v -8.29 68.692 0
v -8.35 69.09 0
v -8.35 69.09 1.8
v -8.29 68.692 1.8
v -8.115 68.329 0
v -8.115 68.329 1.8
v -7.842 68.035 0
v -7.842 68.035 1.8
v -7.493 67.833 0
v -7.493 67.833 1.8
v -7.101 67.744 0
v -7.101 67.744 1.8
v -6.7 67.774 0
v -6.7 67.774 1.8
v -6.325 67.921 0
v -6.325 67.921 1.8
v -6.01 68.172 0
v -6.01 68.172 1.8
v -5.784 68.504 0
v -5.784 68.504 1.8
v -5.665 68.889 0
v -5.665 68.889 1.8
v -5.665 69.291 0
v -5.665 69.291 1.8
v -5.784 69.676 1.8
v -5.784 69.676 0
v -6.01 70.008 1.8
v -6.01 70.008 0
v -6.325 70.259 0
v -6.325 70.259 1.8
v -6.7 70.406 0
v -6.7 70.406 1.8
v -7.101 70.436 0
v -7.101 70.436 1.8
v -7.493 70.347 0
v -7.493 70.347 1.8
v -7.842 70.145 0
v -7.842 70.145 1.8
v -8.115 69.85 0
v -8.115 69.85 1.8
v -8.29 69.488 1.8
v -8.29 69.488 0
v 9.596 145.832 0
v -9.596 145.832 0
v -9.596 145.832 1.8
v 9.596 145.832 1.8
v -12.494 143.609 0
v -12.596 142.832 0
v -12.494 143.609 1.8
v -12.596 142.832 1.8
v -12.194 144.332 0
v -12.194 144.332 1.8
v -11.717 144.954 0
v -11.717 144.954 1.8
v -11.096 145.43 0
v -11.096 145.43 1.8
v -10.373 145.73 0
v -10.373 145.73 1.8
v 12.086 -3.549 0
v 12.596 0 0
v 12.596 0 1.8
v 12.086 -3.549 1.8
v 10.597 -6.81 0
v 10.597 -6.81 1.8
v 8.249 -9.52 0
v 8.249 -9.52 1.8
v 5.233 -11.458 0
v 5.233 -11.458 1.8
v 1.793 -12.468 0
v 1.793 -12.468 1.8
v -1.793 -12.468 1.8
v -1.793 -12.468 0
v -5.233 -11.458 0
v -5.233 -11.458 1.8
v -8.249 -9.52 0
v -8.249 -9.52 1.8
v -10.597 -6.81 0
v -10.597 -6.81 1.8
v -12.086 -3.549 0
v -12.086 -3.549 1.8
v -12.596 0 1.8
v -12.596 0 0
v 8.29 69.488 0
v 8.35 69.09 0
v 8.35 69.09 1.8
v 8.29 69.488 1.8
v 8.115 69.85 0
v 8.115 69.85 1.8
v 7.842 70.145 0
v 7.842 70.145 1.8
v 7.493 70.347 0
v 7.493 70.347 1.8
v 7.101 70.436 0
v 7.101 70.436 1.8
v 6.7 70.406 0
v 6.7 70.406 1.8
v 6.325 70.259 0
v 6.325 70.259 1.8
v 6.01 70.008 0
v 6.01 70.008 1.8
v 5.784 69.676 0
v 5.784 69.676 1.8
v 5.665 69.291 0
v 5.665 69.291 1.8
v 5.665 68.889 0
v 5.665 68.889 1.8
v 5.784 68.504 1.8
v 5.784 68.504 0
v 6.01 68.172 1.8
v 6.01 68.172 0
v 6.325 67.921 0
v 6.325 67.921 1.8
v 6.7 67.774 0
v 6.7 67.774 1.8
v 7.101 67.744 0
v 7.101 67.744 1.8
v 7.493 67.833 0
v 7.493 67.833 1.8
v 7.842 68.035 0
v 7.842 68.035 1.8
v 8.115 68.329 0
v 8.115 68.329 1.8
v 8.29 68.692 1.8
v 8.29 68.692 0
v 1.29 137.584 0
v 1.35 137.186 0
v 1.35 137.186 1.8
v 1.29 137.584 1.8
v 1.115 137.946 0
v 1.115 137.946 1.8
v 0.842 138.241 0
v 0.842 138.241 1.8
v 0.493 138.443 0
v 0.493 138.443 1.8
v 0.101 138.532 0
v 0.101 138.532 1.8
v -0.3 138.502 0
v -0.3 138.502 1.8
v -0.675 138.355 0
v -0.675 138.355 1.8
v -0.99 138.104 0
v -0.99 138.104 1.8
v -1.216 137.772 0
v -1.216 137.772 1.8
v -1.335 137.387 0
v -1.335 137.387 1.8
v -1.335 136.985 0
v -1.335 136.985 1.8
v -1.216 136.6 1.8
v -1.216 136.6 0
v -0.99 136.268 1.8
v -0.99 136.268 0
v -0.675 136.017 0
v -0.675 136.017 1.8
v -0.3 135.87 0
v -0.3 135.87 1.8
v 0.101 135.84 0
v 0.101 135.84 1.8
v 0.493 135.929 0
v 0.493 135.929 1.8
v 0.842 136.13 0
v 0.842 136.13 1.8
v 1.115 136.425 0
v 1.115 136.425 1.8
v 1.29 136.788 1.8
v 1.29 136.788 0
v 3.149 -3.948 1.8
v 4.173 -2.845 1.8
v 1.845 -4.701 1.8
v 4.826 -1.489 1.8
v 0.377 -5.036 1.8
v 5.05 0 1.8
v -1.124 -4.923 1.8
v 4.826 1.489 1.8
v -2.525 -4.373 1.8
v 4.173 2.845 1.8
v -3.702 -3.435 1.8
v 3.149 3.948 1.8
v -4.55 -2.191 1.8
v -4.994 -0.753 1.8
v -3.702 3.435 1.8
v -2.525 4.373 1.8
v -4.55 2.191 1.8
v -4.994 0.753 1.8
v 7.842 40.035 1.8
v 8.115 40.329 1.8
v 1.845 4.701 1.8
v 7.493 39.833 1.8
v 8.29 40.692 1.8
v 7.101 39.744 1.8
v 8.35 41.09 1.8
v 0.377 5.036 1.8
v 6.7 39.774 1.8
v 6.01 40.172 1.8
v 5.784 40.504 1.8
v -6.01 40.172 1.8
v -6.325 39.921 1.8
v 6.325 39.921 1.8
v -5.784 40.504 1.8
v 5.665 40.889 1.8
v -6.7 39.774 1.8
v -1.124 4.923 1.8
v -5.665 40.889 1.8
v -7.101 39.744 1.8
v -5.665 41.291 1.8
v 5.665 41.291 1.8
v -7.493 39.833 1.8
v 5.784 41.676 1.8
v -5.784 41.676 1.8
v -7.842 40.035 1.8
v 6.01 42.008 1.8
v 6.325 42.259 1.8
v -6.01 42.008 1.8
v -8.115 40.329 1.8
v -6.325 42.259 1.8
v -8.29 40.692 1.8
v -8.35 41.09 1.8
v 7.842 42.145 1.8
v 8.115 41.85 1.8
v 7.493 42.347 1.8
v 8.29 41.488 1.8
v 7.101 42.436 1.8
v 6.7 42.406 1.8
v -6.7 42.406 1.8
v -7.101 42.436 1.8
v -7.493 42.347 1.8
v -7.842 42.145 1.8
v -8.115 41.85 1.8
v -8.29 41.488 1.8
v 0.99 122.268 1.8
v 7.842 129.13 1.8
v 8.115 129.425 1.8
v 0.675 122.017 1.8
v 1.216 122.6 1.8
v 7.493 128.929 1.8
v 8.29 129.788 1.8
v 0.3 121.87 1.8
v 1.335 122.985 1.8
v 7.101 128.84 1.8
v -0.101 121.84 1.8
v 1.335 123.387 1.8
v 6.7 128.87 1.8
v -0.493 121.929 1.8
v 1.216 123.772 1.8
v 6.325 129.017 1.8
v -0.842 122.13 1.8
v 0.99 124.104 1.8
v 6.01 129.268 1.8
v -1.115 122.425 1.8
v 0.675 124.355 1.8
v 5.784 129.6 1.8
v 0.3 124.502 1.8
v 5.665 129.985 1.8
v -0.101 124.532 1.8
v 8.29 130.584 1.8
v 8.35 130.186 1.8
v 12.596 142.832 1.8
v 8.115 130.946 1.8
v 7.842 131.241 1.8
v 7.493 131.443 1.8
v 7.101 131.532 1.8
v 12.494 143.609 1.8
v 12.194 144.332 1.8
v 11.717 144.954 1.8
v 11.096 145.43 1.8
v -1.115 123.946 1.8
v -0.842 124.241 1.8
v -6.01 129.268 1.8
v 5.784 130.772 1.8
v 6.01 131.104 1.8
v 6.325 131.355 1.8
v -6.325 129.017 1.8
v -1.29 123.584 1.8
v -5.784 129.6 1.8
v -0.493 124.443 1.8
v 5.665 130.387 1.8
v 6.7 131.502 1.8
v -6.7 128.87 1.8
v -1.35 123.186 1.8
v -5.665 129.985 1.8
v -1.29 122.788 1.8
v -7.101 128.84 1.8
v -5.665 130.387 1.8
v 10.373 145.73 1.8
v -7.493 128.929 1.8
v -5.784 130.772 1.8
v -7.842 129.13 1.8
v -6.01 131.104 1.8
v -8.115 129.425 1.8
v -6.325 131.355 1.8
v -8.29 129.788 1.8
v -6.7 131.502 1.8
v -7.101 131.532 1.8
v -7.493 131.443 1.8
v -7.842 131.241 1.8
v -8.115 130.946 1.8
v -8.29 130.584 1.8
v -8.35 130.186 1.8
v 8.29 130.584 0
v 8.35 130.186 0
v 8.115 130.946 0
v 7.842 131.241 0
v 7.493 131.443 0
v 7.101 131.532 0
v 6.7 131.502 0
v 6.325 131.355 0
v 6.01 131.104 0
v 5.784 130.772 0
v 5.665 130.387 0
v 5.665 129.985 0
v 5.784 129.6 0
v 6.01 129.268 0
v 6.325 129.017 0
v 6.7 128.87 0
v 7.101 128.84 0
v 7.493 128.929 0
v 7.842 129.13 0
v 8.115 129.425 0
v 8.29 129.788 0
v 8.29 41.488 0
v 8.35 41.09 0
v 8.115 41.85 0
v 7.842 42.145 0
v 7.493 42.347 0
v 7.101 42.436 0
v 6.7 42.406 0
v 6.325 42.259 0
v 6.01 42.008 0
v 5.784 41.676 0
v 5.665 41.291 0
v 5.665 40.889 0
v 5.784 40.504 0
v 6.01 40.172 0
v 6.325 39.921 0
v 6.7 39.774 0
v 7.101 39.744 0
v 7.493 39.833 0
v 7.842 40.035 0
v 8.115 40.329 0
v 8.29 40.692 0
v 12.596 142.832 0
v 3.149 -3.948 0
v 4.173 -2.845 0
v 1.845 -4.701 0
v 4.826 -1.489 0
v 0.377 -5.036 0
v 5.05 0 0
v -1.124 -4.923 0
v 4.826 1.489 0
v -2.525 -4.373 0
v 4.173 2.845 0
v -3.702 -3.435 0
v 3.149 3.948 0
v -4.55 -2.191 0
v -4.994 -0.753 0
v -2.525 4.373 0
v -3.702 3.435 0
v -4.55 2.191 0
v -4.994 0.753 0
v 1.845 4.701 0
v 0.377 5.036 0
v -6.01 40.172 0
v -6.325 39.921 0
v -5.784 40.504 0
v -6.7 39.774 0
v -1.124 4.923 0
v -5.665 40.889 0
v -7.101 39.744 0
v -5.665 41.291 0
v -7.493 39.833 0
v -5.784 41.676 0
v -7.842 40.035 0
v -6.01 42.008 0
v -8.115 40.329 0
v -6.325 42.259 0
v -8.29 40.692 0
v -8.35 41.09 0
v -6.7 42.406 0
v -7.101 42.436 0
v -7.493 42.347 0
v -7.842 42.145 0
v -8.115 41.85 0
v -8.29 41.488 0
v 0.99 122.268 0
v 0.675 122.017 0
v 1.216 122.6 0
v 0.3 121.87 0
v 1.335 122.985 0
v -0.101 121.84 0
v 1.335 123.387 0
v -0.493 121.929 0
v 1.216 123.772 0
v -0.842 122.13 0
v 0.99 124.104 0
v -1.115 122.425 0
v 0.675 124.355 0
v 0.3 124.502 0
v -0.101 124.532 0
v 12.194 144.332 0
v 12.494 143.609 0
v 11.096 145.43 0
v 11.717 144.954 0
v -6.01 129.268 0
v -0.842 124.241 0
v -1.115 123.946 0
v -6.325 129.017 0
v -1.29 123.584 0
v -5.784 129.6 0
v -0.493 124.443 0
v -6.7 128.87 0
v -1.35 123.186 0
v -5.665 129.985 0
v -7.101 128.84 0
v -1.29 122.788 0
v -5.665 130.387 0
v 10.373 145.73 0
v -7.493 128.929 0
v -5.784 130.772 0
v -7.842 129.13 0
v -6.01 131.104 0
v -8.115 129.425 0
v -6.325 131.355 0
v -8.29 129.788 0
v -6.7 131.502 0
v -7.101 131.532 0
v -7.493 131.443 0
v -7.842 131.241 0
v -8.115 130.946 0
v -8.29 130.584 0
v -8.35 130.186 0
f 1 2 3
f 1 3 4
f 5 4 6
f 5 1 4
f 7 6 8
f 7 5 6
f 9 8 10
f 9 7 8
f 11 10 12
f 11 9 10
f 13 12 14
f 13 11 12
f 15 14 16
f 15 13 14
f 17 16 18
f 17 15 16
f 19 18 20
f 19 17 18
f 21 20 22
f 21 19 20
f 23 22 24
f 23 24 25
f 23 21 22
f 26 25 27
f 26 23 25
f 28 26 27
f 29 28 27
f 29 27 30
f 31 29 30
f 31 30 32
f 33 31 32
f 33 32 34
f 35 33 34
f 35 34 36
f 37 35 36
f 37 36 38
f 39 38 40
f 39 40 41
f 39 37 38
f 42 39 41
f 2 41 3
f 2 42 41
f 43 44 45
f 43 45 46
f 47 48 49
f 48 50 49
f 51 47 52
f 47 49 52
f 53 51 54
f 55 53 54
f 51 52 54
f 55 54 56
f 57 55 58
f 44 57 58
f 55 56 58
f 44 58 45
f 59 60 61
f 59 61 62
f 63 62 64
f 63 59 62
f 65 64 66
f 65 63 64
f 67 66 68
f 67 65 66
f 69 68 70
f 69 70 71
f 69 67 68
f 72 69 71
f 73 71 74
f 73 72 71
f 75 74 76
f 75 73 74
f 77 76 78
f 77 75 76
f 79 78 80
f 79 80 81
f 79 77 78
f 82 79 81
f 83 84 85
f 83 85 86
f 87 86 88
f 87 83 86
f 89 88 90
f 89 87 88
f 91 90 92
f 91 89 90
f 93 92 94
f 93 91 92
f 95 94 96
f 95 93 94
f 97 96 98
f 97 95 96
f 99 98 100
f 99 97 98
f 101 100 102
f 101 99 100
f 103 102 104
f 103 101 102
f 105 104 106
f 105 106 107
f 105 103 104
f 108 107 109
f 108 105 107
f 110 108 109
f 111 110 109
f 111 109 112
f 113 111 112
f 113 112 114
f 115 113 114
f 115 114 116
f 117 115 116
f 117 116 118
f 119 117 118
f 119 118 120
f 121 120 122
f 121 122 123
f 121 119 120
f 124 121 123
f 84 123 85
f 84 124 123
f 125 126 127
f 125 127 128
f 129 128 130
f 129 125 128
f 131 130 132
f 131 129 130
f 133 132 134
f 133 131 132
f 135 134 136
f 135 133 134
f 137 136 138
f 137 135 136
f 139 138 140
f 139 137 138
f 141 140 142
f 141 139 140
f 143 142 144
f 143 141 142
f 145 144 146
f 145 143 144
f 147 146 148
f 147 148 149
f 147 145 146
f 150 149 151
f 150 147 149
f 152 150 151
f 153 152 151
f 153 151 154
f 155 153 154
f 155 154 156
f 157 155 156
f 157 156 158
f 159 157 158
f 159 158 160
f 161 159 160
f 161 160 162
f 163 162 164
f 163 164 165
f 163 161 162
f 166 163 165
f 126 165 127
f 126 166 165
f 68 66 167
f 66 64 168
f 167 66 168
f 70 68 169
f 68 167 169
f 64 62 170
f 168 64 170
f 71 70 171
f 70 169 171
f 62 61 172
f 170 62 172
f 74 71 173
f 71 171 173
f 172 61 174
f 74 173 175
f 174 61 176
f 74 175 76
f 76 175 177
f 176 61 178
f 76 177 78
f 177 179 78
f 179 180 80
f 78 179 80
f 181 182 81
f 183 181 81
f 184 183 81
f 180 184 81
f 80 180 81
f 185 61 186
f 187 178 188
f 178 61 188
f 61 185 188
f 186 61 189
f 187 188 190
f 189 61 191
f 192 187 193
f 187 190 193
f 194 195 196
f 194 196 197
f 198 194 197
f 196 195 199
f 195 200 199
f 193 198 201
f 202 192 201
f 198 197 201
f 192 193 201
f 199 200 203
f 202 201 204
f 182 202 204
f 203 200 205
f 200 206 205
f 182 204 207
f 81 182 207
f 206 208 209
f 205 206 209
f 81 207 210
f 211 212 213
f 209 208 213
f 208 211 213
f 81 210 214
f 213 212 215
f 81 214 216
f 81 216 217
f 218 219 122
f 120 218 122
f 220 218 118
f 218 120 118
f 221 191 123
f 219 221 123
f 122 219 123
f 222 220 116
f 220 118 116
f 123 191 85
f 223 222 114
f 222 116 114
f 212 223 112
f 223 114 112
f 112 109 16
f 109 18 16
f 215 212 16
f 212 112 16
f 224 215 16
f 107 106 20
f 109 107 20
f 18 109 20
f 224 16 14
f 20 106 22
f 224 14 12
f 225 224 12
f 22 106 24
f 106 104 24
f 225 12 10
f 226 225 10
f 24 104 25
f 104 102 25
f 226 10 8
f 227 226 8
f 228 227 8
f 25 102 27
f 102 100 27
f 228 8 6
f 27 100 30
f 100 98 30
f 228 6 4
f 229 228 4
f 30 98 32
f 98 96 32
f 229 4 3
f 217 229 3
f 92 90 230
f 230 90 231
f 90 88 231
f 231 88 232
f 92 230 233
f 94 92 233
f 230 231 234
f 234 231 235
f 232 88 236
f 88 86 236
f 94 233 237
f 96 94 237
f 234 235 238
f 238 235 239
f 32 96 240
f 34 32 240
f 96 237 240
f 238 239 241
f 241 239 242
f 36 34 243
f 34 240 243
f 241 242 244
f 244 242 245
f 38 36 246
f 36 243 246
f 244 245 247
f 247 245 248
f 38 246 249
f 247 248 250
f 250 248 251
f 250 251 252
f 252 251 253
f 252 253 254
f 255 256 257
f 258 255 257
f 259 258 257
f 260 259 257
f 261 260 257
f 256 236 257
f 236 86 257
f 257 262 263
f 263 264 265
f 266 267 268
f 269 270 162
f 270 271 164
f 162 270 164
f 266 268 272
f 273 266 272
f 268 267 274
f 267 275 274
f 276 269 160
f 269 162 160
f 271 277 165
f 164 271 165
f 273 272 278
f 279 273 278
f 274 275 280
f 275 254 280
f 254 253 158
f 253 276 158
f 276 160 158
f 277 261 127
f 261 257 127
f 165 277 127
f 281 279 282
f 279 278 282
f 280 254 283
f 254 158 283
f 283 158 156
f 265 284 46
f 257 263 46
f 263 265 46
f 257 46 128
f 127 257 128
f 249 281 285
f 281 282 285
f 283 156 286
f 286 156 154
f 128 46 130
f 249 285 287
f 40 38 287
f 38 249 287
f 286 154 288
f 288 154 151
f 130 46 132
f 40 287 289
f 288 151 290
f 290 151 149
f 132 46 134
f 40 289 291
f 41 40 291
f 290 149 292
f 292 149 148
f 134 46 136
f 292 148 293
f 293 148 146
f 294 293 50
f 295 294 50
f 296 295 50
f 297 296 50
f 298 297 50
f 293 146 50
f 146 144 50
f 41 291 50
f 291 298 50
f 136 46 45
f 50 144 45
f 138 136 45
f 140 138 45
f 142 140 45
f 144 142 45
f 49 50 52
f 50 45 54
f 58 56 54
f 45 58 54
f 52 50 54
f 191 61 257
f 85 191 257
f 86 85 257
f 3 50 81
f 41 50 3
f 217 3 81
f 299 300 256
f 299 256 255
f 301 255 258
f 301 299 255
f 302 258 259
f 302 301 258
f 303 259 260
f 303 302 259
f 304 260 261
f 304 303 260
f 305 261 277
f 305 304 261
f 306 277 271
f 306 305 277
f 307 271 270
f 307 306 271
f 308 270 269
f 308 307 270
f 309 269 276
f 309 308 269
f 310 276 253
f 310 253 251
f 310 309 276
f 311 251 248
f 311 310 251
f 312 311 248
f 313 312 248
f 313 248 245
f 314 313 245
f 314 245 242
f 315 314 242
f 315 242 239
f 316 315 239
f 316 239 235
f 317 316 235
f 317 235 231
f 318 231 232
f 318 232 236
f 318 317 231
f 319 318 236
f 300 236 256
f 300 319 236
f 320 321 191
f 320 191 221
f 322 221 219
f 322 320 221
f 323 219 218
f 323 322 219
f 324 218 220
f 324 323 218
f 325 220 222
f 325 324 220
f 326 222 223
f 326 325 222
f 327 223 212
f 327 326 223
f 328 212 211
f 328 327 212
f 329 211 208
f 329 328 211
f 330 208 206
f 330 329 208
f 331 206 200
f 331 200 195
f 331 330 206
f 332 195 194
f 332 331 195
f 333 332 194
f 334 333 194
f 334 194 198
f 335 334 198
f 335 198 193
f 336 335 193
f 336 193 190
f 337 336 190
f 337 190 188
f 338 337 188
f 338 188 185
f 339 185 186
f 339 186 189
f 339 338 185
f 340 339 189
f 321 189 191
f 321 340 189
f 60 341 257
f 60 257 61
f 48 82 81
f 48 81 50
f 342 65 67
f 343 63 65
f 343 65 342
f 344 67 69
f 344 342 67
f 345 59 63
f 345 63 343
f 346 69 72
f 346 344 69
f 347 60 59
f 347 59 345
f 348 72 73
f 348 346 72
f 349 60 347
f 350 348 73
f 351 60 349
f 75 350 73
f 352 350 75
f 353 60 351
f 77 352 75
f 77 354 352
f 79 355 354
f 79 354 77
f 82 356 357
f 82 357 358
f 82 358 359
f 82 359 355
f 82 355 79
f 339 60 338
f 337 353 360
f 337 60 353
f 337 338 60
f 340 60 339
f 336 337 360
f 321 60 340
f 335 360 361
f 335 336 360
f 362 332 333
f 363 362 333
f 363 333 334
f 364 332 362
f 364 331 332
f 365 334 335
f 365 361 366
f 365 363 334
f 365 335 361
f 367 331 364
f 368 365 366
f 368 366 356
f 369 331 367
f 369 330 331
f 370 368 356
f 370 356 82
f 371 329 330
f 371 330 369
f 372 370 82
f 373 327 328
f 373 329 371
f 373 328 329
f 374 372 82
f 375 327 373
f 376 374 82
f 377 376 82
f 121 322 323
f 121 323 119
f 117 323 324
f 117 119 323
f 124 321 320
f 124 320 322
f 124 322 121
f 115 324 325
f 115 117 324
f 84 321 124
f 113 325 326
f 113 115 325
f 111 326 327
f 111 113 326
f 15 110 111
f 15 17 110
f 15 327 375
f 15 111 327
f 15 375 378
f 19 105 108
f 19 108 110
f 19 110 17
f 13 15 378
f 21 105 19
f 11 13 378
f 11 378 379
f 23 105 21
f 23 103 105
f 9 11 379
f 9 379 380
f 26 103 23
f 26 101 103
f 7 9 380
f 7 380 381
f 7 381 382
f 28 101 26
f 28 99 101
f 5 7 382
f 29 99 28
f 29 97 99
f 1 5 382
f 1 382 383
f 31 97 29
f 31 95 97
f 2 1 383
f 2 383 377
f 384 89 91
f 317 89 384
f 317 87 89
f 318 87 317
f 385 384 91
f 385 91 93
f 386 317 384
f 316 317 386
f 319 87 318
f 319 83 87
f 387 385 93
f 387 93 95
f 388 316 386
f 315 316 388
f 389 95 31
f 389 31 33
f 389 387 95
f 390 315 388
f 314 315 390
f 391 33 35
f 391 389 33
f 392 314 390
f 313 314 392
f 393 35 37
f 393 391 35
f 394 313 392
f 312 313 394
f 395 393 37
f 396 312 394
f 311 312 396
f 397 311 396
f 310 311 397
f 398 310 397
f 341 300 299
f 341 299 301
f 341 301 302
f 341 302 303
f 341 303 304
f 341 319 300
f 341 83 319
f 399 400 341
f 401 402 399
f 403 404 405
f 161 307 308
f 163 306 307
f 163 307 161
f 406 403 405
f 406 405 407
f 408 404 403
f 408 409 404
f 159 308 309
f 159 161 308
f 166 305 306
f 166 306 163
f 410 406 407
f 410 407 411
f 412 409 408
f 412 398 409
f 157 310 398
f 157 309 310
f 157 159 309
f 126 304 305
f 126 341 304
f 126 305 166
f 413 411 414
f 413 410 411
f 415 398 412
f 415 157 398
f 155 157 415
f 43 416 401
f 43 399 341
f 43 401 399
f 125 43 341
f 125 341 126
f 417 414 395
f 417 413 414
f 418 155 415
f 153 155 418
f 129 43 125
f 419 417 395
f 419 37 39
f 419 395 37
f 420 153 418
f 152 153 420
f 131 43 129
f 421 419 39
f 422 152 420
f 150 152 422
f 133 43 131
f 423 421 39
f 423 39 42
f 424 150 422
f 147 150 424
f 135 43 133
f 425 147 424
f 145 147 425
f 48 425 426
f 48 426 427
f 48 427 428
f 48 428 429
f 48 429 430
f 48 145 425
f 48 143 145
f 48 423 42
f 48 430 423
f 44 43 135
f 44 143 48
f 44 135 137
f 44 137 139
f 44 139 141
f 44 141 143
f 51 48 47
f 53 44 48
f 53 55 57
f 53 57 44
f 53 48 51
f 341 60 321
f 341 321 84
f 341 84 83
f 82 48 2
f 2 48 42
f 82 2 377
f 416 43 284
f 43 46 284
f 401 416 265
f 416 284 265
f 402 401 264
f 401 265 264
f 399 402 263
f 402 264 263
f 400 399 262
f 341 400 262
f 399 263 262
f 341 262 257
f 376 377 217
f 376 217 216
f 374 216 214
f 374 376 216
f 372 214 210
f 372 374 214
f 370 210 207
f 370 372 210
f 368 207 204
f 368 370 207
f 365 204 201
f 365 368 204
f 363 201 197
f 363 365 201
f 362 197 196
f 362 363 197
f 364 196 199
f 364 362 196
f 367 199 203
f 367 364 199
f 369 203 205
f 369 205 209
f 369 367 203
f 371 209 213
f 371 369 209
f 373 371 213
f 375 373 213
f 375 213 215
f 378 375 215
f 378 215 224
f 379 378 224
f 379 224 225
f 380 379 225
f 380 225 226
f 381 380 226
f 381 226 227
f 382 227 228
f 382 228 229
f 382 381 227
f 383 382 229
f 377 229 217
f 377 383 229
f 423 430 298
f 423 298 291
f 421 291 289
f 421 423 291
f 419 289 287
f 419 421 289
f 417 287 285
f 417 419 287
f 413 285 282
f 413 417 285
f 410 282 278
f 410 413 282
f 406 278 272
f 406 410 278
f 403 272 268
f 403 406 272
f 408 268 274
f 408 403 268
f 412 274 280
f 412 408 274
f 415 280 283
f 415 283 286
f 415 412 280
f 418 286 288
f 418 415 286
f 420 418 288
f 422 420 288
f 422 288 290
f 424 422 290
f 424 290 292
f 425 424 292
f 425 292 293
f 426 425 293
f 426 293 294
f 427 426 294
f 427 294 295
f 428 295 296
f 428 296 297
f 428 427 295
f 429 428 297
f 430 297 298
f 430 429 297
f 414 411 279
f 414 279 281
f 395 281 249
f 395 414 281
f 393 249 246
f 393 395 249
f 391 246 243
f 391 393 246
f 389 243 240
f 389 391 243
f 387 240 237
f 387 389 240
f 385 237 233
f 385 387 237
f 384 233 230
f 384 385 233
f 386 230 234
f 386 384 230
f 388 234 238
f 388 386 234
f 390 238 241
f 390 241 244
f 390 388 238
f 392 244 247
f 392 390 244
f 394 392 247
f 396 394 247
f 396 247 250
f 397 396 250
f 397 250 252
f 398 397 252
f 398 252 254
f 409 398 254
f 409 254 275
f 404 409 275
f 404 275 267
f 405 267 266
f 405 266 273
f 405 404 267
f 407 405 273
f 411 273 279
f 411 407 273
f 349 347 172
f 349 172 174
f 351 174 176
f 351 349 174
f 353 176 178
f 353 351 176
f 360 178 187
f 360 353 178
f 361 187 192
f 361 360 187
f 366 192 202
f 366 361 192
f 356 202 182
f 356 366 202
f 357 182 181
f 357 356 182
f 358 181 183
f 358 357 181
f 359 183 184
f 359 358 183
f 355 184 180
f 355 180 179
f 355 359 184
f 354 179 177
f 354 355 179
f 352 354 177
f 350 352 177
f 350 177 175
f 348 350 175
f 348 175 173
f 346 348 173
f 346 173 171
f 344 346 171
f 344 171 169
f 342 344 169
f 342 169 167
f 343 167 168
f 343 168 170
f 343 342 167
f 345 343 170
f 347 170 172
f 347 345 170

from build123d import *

# Parameters (mm, degrees)
ESBO_O1_R                = 1.35
ESBO_O1_R_2              = 5.05
RESSALTO_EXTRUS_O1_DEPTH = 1.8
FILETE1_R                = 3
FILETE2_R                = 3


with BuildPart() as part:
    # Esboço1 → Ressalto-extrusão1 (new body)
    with BuildSketch(Plane.XY):
        with BuildLine():
            Line((-12.596174938, 0), (-12.596174938, 145.832394841))
            Line((-12.596174938, 145.832394841), (12.596174938, 145.832394841))
            Line((12.596174938, 145.832394841), (12.596174938, 0))
            ThreePointArc((12.596174938, 0), (0, -12.596174938), (-12.596174938, 0))
        make_face()
        with Locations((7, 41.089981595)):
            Circle(ESBO_O1_R, mode=Mode.SUBTRACT)
        with Locations((7, 69.089981595)):
            Circle(ESBO_O1_R, mode=Mode.SUBTRACT)
        with Locations(Location((-7, 41.089981595, 0), (0, 0, 180))):
            Circle(ESBO_O1_R, mode=Mode.SUBTRACT)
        with Locations(Location((-7, 69.089981595, 0), (0, 0, 180))):
            Circle(ESBO_O1_R, mode=Mode.SUBTRACT)
        with Locations((7, 130.185826181)):
            Circle(ESBO_O1_R, mode=Mode.SUBTRACT)
        with Locations((0, 137.185826181)):
            Circle(ESBO_O1_R, mode=Mode.SUBTRACT)
        with Locations(Location((-7, 130.185826181, 0), (0, 0, 180))):
            Circle(ESBO_O1_R, mode=Mode.SUBTRACT)
        with Locations(Location((0, 123.185826181, 0), (0, 0, 180))):
            Circle(ESBO_O1_R, mode=Mode.SUBTRACT)
        Circle(ESBO_O1_R_2, mode=Mode.SUBTRACT)
    extrude(amount=RESSALTO_EXTRUS_O1_DEPTH)

    # Filete1
    filete1_edges = [part.edges().sort_by_distance(p)[0] for p in [
        (-12.596174938, 145.832394841, 0.9),
    ]]
    fillet(filete1_edges, radius=FILETE1_R)

    # Filete2
    filete2_edges = [part.edges().sort_by_distance(p)[0] for p in [
        (12.596174938, 145.832394841, 0.9),
    ]]
    fillet(filete2_edges, radius=FILETE2_R)


solid = part.part
